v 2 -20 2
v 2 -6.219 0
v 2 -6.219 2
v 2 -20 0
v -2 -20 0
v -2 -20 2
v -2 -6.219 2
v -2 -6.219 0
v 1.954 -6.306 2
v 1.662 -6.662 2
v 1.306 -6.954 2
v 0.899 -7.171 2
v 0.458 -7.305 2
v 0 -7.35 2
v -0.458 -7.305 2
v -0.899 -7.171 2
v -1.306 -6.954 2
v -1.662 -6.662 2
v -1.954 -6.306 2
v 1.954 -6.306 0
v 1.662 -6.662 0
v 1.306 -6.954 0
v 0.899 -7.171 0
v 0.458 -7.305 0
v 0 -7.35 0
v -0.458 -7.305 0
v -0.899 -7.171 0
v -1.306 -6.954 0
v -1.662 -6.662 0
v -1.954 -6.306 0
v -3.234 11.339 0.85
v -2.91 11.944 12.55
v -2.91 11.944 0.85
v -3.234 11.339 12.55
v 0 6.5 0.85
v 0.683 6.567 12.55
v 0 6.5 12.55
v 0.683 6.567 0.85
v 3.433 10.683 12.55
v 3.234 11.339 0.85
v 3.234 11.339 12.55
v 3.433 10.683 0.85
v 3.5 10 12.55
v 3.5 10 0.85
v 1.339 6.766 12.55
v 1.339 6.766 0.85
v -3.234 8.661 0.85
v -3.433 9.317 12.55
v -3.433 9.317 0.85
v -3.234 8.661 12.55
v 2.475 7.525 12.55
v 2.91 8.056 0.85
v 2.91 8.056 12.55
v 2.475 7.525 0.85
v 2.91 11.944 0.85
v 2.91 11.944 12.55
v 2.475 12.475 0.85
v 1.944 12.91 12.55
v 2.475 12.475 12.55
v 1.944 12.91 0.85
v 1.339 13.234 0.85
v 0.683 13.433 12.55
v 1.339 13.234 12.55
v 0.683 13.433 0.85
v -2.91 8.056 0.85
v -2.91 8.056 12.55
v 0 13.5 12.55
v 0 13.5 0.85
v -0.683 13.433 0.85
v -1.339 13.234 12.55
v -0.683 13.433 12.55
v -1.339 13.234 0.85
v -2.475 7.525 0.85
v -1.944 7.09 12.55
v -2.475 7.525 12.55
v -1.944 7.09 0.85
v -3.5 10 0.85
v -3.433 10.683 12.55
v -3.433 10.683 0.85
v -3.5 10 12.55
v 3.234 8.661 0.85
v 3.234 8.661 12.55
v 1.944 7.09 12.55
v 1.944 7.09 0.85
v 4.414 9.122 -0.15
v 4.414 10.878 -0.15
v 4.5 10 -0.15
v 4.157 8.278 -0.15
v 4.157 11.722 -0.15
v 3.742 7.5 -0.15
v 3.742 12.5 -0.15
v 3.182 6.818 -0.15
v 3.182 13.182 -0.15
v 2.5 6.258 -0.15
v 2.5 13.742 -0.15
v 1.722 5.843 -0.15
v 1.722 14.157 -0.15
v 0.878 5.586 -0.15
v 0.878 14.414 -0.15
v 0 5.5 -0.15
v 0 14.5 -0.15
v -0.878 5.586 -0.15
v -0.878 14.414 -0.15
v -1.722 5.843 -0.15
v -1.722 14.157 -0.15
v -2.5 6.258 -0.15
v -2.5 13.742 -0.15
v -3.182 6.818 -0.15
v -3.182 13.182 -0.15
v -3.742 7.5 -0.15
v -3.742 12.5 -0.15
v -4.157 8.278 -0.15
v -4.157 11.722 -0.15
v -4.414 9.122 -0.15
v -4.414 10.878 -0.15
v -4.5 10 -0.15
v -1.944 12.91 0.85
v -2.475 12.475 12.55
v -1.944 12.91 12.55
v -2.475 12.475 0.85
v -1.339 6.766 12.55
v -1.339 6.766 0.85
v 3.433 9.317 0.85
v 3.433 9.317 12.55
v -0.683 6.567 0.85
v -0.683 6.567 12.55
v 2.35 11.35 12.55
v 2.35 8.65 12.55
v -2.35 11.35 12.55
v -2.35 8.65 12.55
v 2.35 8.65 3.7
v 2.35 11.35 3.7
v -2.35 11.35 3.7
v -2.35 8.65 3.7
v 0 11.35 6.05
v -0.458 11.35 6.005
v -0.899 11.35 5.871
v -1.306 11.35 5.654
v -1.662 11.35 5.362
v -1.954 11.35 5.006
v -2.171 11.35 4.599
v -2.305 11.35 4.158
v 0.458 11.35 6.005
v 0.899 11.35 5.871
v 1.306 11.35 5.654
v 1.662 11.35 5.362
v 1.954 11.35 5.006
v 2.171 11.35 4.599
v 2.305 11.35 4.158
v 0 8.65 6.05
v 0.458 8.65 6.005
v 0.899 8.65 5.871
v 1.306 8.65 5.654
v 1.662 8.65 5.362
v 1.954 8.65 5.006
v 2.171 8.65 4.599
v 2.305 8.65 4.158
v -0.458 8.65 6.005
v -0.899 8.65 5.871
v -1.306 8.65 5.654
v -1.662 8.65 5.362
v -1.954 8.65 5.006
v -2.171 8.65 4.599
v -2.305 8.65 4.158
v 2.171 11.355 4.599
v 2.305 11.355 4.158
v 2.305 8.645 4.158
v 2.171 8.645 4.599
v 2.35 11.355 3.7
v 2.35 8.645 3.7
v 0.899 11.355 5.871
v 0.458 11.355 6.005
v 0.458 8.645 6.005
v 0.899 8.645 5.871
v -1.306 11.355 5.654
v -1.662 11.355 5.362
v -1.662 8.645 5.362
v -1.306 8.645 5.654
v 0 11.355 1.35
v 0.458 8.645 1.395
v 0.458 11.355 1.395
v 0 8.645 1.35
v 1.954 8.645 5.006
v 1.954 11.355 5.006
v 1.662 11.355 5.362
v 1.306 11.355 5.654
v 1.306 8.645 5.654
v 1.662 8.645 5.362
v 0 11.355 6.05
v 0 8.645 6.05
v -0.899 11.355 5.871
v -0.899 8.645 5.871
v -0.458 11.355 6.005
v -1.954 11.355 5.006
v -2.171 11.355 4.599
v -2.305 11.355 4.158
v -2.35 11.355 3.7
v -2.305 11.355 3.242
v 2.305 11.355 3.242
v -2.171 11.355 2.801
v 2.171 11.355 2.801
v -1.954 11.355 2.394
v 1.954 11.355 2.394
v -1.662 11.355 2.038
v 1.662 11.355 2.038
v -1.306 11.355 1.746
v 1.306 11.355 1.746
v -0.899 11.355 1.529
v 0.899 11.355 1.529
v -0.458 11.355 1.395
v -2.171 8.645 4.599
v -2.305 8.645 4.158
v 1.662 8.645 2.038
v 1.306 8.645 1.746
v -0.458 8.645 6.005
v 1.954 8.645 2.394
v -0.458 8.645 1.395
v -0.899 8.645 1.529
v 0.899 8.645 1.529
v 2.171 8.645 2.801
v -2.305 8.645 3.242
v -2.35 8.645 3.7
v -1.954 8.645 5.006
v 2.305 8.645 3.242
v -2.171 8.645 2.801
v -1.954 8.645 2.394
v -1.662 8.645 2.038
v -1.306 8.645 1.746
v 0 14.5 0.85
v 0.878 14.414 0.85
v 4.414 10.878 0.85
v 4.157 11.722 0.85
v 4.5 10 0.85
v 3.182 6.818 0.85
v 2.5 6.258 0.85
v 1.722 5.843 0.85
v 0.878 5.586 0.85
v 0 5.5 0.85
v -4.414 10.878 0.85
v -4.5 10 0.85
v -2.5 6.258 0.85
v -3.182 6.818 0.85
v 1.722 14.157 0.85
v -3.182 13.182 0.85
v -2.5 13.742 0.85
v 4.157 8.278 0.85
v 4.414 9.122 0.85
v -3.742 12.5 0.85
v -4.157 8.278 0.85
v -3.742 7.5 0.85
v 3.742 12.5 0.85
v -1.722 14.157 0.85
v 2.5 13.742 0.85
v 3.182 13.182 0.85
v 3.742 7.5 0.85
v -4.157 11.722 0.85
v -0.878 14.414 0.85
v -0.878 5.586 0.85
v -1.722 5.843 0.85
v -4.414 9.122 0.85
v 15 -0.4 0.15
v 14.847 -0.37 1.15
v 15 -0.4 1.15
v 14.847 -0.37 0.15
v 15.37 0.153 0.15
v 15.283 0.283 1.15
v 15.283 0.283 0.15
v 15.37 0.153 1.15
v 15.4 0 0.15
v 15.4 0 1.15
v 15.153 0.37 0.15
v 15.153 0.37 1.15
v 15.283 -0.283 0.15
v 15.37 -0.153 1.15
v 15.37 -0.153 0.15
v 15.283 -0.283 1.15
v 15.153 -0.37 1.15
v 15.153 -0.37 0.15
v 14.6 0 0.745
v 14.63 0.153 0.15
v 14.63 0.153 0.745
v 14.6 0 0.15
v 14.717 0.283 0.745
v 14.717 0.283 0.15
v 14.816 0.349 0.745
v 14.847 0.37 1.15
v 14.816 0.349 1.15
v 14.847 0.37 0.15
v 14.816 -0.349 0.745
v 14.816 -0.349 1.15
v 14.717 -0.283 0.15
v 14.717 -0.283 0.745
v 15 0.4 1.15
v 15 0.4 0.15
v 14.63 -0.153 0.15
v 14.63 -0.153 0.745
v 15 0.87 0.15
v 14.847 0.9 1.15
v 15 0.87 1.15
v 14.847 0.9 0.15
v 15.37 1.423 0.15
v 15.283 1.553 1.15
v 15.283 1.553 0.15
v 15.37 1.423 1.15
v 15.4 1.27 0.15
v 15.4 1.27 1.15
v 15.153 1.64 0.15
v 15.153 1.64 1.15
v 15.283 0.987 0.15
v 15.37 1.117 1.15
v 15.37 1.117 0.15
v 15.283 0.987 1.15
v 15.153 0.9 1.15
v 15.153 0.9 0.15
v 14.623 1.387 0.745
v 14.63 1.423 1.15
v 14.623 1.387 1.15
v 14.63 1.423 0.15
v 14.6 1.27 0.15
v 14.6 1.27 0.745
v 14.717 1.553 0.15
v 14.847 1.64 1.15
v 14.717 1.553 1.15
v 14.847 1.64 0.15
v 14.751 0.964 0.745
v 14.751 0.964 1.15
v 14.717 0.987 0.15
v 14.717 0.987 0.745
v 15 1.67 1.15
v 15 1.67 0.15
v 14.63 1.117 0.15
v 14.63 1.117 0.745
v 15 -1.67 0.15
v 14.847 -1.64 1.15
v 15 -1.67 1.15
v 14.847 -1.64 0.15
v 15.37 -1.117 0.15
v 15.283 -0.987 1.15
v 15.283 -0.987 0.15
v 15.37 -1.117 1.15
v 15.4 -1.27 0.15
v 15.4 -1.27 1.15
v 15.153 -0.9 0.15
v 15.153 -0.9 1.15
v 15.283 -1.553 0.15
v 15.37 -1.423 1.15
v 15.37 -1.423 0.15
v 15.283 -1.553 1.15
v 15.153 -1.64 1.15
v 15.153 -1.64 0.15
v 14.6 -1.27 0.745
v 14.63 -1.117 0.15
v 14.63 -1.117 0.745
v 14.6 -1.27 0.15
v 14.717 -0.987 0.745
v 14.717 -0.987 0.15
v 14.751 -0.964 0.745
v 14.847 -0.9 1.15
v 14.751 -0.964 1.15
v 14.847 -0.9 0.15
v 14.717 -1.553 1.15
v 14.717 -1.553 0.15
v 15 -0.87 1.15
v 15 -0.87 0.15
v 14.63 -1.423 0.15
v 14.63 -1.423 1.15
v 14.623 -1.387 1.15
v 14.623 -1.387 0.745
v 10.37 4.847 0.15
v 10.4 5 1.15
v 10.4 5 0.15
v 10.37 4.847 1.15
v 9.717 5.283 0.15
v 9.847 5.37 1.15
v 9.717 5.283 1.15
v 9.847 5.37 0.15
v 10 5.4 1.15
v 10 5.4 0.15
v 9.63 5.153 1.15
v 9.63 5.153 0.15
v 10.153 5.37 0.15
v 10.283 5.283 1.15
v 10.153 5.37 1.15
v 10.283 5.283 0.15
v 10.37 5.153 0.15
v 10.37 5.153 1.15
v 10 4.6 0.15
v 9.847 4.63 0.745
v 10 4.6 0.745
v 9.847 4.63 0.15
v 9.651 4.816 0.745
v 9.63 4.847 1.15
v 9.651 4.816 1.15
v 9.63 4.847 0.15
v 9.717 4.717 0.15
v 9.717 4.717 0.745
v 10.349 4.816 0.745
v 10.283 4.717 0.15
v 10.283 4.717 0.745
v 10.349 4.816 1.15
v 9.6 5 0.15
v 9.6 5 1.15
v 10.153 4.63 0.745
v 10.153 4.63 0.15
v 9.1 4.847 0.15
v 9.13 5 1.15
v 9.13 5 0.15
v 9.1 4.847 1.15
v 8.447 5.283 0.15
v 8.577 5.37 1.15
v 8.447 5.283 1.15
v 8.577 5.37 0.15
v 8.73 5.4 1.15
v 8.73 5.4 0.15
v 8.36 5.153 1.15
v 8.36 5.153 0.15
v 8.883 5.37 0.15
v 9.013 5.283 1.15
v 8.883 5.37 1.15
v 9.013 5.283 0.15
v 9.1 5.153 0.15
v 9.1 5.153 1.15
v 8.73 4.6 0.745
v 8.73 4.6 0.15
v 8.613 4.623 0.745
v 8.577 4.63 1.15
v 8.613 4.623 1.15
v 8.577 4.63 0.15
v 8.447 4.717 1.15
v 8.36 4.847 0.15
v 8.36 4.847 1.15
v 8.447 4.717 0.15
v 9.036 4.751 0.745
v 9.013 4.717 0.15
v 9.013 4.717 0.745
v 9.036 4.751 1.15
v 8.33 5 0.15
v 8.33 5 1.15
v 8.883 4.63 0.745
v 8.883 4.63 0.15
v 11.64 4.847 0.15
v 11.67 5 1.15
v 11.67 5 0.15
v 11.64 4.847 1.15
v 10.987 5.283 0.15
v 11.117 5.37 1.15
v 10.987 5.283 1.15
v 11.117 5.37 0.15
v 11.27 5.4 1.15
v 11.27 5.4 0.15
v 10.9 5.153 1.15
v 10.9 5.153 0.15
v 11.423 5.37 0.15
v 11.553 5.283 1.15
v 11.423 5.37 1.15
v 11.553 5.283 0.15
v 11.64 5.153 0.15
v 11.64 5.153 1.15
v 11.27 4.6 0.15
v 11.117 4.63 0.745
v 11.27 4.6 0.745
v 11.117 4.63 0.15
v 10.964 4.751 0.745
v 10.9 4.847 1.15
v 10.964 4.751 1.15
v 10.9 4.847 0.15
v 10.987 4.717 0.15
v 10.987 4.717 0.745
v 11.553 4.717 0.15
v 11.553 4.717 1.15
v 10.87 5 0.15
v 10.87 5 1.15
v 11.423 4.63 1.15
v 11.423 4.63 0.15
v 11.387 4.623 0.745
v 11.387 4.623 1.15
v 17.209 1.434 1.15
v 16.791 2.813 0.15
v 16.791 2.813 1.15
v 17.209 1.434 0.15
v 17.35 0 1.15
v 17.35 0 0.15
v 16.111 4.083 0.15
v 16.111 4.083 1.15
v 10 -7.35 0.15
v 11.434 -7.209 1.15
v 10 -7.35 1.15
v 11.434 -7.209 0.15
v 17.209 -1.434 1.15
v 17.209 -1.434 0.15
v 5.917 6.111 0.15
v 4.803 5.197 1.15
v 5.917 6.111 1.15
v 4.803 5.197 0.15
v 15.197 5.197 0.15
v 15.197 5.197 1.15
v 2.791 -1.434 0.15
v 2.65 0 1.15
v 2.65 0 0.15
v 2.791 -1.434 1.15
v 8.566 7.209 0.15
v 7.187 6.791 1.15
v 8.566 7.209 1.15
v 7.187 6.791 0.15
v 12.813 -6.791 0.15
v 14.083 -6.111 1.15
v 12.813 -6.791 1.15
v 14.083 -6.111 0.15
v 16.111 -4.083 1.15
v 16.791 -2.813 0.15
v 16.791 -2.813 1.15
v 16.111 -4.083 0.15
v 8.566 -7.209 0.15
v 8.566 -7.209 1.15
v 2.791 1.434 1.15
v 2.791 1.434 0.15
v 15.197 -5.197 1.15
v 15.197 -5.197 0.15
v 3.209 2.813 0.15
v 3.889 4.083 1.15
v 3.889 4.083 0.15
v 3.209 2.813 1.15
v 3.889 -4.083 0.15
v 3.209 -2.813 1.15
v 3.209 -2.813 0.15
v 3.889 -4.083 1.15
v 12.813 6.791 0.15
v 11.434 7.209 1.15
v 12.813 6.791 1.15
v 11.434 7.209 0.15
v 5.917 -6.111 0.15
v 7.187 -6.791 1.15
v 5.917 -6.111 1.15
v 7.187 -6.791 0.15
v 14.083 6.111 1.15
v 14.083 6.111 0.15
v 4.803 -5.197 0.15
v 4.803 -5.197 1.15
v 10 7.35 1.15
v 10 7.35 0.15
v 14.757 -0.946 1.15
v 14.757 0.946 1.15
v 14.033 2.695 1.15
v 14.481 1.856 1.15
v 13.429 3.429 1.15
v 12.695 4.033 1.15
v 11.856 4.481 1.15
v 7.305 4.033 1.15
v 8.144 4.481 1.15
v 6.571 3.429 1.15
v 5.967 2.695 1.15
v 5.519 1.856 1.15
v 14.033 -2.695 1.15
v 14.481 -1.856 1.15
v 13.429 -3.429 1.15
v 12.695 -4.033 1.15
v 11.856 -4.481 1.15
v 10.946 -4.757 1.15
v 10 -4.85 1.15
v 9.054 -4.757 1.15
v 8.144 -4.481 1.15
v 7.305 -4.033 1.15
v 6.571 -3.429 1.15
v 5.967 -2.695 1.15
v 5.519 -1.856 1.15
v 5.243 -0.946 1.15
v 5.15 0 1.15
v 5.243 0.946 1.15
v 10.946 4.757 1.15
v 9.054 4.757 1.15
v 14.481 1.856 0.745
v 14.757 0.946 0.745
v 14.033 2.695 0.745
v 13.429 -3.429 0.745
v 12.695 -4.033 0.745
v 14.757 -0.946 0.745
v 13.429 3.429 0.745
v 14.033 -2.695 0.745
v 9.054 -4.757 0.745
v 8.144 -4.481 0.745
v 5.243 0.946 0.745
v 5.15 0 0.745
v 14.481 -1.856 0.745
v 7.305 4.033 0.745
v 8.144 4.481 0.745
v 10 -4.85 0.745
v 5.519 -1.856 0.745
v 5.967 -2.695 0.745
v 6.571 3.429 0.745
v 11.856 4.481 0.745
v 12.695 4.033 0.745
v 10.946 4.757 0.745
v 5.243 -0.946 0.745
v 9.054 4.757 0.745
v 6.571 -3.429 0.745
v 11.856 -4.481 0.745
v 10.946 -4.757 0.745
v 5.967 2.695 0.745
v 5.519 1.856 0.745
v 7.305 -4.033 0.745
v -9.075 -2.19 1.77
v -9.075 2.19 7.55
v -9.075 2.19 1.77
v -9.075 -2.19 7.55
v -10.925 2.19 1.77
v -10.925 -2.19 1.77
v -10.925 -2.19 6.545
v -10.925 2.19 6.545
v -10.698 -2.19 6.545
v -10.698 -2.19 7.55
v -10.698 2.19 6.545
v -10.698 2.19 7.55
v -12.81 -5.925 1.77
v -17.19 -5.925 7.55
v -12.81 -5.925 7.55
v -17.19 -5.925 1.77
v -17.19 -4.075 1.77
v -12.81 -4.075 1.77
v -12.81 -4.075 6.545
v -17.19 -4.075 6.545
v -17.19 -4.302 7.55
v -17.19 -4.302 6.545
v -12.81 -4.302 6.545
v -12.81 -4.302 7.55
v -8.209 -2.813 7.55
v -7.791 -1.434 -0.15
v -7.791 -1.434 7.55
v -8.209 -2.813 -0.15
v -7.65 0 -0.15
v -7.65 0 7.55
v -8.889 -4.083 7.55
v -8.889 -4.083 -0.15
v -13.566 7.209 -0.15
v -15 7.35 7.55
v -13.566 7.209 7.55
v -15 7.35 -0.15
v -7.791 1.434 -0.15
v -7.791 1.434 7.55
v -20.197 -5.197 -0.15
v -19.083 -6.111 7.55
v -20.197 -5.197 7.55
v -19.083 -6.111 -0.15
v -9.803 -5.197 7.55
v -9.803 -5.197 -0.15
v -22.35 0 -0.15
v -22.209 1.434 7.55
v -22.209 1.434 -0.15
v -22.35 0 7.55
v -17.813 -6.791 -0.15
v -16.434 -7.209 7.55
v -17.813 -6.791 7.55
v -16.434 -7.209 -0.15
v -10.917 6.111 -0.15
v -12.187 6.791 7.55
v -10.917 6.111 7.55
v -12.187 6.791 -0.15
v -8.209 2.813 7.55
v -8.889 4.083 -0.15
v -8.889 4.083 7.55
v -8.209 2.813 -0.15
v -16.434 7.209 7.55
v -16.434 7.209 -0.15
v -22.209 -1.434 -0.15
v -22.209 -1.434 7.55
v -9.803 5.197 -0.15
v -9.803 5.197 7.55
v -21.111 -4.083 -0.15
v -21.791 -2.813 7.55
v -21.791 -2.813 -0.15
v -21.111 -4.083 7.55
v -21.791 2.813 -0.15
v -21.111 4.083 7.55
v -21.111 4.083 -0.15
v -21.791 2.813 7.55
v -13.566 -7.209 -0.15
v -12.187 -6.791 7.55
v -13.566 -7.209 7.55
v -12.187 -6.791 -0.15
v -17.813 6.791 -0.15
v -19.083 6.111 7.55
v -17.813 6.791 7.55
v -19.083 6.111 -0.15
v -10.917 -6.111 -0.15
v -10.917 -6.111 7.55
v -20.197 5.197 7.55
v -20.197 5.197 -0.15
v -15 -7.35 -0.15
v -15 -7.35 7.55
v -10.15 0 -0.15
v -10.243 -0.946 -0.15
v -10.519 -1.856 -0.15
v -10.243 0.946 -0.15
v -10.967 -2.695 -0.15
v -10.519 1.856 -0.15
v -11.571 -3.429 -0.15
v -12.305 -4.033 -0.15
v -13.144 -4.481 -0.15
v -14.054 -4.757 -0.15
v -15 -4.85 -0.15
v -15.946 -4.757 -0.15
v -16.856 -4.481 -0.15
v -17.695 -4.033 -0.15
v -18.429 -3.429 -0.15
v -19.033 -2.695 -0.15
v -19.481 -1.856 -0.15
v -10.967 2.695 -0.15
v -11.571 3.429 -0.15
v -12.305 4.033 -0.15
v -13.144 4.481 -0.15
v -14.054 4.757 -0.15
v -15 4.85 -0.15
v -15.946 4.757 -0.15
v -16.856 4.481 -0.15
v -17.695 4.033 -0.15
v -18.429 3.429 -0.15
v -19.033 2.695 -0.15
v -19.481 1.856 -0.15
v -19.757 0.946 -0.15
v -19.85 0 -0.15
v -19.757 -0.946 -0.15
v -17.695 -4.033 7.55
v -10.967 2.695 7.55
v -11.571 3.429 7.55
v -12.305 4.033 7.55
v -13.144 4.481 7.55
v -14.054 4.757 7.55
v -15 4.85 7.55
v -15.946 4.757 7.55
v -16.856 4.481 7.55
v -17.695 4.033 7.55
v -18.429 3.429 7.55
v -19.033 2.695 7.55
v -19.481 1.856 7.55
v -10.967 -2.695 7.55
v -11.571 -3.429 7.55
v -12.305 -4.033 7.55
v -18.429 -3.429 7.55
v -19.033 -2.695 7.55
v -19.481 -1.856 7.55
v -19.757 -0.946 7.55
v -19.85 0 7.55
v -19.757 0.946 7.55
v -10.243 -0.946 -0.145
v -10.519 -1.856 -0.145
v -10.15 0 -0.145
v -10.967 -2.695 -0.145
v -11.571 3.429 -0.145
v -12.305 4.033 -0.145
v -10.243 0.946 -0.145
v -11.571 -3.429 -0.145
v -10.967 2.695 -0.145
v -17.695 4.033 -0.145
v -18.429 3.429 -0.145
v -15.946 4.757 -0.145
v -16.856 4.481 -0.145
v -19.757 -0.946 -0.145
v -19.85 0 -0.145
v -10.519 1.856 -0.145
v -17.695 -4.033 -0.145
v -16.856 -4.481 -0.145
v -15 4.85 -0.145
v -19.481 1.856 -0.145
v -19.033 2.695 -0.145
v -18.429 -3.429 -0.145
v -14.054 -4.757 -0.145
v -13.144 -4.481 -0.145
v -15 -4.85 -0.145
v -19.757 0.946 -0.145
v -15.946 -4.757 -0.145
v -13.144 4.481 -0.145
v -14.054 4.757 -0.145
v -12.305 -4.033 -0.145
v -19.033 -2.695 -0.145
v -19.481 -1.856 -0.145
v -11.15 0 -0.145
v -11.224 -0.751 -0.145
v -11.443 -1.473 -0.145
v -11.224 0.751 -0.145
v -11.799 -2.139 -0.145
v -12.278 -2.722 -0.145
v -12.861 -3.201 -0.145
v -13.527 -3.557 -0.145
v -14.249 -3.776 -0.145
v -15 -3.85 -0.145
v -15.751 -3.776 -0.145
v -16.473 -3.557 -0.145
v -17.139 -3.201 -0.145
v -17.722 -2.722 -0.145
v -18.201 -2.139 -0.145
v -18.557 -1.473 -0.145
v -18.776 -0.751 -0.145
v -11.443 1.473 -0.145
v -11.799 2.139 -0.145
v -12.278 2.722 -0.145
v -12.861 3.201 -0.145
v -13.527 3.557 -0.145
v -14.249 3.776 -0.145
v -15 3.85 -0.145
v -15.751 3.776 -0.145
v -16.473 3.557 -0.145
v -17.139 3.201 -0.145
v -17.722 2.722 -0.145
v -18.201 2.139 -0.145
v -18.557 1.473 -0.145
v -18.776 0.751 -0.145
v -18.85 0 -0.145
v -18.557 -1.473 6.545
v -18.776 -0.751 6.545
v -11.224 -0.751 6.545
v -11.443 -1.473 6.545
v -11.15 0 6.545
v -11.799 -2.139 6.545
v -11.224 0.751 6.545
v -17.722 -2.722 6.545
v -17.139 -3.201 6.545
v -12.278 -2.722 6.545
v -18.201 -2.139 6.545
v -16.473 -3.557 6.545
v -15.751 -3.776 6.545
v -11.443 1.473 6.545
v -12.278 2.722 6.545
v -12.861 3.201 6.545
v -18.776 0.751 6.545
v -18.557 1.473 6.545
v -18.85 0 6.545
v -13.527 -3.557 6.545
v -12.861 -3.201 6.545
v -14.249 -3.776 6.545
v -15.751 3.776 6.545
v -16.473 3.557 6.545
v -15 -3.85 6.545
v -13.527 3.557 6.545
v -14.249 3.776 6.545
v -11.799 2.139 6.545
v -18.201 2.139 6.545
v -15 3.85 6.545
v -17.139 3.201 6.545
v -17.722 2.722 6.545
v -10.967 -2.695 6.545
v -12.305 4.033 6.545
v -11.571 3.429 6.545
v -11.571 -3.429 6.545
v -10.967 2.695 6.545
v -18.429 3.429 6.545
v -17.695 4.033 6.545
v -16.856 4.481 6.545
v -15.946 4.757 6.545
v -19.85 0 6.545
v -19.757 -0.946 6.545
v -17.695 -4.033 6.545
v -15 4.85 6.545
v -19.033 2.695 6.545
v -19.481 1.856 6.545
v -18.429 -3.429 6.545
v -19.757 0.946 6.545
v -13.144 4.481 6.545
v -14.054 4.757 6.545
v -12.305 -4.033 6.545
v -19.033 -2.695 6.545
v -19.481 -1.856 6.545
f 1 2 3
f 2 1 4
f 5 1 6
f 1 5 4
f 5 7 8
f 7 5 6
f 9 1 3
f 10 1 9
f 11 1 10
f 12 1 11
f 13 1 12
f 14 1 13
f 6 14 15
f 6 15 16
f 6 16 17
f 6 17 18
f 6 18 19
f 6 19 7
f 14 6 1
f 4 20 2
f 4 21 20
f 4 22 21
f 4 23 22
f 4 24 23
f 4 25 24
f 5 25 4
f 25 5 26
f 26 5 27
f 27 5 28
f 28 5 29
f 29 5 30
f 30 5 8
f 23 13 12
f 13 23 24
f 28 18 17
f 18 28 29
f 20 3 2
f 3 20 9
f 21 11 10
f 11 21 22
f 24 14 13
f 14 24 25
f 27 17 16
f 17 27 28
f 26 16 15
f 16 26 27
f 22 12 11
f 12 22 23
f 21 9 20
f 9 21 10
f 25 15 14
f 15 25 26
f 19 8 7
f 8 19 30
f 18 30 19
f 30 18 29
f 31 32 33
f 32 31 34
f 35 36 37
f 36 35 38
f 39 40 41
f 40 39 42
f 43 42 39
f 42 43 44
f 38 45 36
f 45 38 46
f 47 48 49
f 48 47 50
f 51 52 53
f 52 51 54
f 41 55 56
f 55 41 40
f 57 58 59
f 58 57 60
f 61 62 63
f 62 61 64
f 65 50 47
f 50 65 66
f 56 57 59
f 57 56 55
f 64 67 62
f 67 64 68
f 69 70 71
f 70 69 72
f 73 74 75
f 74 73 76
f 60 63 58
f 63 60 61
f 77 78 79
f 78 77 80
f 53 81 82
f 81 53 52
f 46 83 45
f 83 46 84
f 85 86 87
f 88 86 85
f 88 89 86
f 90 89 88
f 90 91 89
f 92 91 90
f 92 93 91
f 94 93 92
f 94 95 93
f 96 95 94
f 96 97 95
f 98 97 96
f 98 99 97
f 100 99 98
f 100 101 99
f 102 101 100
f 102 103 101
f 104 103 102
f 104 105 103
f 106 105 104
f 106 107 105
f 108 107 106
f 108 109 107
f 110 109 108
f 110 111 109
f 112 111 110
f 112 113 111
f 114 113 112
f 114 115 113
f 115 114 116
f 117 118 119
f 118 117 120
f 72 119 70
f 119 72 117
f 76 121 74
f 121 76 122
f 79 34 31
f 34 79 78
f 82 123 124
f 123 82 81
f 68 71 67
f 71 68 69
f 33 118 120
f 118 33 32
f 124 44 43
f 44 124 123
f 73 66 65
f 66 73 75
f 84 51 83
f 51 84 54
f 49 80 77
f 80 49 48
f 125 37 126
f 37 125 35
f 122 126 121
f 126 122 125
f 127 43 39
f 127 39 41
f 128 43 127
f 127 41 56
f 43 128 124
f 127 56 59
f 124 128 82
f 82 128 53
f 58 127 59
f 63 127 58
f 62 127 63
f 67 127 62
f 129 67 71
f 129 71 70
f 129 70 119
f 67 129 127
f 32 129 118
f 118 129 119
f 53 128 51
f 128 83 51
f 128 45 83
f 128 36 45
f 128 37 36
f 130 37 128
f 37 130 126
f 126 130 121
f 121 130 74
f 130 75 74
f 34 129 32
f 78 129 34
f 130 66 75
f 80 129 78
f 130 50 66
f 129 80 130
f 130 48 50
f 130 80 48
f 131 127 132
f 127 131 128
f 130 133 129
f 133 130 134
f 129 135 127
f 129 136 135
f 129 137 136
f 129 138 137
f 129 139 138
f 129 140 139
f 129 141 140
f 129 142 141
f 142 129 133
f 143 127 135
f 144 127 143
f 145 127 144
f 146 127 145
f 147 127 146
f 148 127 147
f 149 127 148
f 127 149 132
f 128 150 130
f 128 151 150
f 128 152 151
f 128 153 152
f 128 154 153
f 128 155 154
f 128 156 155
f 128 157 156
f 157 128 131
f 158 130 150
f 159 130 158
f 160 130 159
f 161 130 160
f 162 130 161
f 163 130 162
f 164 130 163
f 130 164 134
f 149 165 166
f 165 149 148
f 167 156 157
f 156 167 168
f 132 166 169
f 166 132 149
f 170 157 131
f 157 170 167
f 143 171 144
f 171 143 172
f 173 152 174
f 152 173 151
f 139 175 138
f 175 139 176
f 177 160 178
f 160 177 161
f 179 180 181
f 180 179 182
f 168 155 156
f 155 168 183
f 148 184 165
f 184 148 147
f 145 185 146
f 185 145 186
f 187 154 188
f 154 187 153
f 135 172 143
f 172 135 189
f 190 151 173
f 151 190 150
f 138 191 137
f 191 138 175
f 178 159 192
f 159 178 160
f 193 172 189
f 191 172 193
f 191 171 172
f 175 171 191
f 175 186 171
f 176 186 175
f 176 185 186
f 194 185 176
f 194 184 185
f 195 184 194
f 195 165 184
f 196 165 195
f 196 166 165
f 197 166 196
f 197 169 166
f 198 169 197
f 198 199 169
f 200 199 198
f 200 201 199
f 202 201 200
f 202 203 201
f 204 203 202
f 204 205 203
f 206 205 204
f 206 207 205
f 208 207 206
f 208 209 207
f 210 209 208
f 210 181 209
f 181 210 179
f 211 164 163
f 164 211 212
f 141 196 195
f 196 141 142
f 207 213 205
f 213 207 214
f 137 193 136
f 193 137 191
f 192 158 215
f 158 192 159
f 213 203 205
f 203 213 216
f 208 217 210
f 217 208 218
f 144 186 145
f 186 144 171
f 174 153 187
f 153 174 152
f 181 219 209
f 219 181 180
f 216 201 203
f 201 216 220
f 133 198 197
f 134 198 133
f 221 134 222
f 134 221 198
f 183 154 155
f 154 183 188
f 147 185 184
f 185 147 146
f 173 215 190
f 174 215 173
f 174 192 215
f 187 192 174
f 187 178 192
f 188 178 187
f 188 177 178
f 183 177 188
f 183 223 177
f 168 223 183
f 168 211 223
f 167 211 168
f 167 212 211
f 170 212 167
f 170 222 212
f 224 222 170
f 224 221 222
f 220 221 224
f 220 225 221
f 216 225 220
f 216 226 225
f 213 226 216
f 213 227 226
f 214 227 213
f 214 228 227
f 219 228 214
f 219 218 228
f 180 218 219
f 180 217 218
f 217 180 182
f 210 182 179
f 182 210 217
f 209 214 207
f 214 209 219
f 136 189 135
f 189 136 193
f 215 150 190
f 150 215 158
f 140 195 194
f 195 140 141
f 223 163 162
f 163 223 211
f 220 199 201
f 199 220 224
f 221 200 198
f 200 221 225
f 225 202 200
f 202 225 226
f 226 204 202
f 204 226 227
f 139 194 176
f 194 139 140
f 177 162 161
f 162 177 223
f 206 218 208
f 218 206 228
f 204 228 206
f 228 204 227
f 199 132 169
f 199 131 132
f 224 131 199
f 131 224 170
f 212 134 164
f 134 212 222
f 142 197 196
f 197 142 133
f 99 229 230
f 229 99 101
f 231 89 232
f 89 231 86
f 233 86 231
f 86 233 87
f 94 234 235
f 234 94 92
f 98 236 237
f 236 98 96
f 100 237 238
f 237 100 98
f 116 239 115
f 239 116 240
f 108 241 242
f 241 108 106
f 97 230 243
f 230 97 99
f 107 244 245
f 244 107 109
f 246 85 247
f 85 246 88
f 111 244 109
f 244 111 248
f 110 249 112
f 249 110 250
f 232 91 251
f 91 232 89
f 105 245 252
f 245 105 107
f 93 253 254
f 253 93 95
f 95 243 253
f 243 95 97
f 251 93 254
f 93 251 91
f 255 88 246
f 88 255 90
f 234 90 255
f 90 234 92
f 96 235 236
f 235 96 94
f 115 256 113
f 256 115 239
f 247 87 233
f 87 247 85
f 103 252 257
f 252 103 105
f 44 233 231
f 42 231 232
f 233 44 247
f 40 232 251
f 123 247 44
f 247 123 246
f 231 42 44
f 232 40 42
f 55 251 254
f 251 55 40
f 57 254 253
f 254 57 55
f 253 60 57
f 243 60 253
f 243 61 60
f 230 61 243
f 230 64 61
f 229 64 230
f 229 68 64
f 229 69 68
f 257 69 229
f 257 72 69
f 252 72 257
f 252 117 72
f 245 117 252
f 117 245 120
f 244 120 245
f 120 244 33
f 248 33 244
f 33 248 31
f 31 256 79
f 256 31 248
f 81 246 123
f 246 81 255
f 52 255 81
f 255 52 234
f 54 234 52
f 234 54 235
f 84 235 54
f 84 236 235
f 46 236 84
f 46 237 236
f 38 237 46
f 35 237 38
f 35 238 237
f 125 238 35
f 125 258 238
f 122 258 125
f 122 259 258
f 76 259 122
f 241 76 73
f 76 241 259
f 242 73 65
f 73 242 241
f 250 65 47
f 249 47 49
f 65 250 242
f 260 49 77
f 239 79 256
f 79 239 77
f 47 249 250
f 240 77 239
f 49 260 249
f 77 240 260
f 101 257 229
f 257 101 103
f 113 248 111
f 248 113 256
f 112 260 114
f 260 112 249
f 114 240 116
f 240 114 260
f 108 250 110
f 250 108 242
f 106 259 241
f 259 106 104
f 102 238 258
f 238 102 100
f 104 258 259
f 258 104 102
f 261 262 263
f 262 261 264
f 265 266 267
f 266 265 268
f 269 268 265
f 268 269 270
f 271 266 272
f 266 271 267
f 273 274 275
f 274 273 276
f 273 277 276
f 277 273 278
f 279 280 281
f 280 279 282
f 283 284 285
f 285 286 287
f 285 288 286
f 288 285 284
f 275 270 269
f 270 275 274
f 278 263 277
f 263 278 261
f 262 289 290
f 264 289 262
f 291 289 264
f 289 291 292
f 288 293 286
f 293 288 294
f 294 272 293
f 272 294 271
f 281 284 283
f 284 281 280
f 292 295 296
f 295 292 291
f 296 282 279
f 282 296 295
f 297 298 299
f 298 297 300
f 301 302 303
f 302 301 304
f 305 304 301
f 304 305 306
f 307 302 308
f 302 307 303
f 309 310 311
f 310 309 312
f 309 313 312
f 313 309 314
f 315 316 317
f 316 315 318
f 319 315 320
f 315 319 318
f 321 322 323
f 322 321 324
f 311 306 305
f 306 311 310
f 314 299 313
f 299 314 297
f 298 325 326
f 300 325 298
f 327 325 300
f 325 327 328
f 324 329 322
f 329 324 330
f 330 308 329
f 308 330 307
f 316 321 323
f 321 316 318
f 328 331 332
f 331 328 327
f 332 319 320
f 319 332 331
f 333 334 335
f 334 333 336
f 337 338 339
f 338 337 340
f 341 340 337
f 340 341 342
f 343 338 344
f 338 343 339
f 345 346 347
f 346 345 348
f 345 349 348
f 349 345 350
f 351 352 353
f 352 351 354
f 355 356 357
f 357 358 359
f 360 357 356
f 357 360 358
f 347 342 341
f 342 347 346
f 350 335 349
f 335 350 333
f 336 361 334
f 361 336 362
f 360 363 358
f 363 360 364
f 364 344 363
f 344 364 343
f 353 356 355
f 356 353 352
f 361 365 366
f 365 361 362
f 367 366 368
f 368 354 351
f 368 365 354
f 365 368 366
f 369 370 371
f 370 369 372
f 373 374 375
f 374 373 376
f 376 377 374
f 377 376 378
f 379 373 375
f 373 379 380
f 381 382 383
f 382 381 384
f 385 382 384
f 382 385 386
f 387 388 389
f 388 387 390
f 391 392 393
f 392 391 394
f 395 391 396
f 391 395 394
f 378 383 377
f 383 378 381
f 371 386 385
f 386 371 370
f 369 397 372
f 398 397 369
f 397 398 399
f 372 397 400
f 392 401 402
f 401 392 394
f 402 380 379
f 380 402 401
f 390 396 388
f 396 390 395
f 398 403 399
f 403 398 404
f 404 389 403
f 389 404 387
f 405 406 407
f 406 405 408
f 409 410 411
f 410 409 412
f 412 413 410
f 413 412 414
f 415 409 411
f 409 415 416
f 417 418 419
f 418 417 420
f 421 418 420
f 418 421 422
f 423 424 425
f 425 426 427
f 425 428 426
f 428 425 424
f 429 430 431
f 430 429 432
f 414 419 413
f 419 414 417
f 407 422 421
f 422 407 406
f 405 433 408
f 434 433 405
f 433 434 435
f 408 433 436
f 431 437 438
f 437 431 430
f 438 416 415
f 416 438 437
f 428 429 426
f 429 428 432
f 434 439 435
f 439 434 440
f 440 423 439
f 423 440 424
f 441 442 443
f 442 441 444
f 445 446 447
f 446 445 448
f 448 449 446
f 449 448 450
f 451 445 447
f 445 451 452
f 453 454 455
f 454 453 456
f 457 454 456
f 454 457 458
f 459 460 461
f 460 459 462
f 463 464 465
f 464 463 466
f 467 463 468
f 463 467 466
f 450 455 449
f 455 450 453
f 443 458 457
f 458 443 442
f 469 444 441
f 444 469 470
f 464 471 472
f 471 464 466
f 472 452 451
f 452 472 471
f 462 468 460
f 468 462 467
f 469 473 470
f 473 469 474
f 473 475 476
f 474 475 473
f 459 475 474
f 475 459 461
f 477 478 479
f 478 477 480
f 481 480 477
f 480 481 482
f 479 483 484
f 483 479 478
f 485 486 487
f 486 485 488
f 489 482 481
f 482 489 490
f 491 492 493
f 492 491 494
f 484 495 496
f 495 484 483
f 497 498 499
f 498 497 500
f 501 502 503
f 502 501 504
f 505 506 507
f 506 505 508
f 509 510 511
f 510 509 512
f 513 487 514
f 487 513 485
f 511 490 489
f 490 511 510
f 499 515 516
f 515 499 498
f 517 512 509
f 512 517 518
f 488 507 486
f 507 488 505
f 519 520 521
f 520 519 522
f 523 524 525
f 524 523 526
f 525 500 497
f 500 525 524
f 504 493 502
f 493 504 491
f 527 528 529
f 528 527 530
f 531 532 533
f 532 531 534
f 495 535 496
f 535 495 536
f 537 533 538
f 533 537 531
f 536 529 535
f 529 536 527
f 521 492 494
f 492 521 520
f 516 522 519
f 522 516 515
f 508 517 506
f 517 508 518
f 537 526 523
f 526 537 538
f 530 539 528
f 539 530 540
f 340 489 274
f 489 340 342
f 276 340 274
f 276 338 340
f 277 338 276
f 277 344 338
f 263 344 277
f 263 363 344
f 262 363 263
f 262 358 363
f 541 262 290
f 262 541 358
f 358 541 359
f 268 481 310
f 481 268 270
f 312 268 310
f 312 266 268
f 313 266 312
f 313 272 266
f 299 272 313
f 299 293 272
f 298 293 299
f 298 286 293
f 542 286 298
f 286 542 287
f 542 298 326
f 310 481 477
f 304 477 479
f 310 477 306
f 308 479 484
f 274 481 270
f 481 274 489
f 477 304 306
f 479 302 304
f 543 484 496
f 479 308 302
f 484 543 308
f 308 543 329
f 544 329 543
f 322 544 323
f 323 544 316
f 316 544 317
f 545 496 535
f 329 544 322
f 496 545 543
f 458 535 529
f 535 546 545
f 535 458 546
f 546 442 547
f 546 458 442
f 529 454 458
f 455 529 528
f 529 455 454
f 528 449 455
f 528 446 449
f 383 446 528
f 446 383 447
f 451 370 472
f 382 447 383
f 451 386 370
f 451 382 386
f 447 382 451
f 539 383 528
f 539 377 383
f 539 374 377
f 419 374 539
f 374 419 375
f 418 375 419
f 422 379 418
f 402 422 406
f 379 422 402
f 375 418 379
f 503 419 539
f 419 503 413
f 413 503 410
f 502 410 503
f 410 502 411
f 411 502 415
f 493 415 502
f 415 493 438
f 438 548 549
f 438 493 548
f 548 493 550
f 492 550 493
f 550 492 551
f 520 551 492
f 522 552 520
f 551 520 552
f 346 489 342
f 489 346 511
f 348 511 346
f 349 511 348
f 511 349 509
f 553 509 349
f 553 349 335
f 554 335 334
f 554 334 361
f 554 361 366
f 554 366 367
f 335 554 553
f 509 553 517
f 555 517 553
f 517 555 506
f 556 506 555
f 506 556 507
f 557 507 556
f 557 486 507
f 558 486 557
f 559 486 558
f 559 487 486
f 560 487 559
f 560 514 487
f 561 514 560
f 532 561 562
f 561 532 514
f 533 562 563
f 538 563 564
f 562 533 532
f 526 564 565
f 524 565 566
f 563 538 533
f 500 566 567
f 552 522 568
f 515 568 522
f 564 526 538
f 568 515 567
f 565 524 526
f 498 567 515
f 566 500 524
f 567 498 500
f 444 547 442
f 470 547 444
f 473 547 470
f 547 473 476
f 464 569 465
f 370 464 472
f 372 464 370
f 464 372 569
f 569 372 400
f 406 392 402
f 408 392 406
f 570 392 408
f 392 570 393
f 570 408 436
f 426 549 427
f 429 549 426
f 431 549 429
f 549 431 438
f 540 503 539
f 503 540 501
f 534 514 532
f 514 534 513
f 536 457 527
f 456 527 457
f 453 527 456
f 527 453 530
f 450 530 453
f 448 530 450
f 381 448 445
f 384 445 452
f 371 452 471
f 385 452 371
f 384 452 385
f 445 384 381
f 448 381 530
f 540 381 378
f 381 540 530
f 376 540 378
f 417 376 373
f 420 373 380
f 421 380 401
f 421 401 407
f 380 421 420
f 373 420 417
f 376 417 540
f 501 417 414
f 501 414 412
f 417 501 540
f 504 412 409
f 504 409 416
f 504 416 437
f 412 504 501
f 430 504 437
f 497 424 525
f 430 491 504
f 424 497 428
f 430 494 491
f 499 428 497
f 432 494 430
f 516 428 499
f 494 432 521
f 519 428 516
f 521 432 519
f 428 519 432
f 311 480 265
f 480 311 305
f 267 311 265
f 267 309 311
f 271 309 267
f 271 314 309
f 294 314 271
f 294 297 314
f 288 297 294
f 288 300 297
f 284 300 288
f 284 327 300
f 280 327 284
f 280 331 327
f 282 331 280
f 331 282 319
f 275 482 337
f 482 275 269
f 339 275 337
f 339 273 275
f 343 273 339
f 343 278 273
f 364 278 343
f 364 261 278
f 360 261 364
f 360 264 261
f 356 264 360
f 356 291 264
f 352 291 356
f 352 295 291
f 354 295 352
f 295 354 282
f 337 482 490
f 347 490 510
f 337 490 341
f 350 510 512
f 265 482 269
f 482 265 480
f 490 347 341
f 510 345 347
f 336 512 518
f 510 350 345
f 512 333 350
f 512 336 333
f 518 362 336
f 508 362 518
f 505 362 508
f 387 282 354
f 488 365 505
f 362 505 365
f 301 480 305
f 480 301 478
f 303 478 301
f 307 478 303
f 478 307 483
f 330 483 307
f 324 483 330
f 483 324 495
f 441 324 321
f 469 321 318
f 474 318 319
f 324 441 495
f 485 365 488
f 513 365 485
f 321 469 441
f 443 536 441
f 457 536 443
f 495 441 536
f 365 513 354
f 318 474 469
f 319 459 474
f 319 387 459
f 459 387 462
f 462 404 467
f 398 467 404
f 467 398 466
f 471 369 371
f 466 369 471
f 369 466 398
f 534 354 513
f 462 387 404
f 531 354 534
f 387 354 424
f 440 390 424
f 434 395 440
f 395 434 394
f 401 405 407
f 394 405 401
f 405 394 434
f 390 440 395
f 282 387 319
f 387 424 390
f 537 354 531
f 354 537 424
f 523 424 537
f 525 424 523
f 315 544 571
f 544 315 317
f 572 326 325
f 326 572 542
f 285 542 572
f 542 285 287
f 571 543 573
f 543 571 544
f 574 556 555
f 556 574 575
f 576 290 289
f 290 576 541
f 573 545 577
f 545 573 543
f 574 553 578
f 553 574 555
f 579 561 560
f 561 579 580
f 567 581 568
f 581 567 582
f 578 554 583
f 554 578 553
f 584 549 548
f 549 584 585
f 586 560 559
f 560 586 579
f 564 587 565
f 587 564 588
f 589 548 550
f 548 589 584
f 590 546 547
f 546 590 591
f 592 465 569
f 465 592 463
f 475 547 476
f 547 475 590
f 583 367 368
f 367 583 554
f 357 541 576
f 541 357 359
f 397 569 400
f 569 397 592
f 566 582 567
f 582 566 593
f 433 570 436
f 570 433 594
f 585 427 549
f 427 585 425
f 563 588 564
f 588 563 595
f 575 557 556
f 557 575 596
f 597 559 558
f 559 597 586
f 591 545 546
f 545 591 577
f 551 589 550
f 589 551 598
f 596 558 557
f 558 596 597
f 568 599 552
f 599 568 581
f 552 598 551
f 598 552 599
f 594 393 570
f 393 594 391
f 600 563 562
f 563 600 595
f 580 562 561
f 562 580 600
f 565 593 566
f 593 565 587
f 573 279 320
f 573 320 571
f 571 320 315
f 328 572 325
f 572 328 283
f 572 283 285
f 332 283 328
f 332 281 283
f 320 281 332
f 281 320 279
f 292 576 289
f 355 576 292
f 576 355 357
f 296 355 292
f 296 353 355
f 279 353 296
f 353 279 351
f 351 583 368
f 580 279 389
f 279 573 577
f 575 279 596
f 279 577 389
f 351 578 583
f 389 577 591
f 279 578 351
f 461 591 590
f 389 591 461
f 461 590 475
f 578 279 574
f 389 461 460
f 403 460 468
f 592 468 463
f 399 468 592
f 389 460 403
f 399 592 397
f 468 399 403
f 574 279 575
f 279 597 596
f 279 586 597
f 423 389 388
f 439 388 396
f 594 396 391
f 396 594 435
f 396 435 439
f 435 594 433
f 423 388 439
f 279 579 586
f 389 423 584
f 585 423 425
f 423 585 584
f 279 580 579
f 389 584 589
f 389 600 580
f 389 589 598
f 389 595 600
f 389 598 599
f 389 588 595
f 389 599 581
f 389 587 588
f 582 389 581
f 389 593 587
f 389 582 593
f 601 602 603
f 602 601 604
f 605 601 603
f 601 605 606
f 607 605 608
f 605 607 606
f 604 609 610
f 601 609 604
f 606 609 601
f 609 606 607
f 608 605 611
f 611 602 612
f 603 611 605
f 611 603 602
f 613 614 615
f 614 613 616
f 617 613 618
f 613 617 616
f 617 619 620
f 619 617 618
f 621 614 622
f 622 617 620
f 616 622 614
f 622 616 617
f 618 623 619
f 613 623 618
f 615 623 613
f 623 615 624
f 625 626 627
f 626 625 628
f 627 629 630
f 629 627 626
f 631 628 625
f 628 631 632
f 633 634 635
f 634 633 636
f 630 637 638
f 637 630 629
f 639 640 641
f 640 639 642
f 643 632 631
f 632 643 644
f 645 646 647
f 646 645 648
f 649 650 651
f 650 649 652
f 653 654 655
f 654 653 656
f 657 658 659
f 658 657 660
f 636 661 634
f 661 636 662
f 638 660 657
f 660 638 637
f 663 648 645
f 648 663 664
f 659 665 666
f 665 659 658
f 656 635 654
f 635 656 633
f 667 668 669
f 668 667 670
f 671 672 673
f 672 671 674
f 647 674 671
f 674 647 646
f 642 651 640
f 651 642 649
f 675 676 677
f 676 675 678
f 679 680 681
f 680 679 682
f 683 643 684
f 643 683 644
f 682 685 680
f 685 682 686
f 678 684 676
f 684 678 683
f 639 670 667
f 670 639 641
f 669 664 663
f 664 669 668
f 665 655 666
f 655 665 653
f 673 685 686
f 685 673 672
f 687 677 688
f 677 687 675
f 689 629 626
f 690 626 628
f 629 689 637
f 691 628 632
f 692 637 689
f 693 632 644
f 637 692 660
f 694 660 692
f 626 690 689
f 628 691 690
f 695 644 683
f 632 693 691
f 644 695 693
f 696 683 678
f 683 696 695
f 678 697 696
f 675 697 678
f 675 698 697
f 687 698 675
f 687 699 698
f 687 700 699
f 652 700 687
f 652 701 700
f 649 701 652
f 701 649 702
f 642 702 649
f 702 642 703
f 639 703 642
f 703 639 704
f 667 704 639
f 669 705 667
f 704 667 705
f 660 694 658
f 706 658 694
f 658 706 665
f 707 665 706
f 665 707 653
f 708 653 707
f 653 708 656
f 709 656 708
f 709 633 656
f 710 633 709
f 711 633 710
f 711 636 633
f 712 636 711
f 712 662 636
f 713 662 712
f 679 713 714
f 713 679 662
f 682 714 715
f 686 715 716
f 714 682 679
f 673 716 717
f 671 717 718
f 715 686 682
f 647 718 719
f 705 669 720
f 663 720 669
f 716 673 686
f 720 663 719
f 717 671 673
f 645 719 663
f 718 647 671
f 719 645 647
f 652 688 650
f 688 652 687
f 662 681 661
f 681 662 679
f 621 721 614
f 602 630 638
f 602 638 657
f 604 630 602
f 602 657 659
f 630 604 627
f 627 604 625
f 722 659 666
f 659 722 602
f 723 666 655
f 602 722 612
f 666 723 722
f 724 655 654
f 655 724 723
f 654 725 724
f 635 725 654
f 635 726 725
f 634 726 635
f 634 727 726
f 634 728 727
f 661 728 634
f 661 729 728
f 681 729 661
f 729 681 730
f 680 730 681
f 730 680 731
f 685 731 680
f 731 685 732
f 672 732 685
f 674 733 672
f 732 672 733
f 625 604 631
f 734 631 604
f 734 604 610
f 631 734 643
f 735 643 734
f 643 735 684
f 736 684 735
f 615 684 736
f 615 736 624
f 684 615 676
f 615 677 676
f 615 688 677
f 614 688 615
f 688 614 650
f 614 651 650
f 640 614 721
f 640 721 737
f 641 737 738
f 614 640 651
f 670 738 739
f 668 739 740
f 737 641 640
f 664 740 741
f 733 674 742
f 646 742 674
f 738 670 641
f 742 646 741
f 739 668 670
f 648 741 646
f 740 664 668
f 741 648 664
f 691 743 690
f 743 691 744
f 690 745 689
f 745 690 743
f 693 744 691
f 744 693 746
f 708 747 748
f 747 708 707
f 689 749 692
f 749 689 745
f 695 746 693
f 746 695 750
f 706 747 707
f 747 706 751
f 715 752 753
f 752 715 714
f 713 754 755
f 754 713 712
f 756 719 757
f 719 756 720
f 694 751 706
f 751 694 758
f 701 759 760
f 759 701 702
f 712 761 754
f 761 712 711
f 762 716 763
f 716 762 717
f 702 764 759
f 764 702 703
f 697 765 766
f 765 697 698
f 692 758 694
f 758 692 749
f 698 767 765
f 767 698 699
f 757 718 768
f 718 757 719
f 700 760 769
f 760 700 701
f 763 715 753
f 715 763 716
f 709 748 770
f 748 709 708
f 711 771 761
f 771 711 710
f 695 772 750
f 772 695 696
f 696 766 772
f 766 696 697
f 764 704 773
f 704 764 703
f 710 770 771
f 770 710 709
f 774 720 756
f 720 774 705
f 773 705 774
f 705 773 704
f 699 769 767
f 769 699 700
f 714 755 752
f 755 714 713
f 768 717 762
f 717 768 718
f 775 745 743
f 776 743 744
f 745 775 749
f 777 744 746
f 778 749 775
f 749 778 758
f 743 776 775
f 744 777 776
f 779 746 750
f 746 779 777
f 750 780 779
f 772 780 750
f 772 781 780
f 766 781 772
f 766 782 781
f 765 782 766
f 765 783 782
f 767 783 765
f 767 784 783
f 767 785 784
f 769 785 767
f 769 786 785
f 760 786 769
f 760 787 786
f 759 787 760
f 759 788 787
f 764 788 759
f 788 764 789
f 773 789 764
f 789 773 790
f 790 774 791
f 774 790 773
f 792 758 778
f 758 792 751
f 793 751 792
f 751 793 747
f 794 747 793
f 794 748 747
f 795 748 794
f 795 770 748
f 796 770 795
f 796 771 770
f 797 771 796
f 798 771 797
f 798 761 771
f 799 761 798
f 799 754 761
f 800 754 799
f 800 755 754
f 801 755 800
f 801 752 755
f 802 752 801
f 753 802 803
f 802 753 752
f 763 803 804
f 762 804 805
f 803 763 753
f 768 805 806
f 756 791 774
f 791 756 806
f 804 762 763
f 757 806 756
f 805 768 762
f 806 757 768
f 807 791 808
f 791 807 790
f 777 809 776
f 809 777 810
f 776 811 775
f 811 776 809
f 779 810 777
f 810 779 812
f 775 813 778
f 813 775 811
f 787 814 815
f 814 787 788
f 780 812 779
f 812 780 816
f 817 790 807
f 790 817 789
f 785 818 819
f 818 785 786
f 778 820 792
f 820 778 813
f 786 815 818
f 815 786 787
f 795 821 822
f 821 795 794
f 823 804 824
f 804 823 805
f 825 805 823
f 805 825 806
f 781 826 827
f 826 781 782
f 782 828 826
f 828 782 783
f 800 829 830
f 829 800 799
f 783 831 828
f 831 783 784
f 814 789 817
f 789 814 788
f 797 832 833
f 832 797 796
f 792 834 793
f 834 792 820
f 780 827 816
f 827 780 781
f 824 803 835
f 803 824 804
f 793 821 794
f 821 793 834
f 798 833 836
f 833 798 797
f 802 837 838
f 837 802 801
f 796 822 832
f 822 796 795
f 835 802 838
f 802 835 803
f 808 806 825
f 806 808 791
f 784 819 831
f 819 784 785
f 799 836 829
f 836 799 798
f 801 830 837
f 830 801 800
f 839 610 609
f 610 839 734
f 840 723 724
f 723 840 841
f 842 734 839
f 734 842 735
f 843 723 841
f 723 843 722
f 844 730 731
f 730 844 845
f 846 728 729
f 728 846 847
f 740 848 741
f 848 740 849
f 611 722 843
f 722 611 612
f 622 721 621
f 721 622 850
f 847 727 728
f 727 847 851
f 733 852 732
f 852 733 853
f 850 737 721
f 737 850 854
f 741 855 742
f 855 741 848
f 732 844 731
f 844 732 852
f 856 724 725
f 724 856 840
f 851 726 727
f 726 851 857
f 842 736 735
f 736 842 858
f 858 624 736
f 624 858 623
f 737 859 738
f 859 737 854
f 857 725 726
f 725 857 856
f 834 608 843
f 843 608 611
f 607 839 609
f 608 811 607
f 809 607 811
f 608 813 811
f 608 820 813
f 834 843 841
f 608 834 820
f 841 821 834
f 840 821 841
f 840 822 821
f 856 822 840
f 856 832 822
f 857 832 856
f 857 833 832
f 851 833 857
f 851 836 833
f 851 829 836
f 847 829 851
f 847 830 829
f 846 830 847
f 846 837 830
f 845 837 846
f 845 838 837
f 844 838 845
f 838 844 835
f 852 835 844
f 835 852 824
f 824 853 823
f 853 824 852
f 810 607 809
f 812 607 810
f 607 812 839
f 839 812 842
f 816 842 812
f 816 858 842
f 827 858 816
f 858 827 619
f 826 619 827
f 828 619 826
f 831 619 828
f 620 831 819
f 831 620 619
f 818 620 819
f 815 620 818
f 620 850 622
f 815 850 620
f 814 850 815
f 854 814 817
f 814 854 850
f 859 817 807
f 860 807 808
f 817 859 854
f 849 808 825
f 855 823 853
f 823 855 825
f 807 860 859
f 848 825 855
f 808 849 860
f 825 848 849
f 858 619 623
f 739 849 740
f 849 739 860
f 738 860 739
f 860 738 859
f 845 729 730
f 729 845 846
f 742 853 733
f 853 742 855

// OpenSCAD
mgh=2;
mgd=4;
delta=0.7;
hndl=15;

module handle(differ=false) {
   if (differ)
        difference() {
            translate([0,0,hndl/2])
                cube([mgd, mgh, hndl], center=true);
            rotate([90,0,0])
                cylinder(d=mgd+delta, h=mgh+0.01, center=true, $fn=32);
        }
    else
        union() {
            translate([0,0,hndl/2])
                cube([mgd+delta, mgh+delta, hndl], center=true);
            rotate([90,0,0])
                cylinder(d=mgd+delta, h=mgh+delta+0.01, center=true, $fn=32);
        };
    
}

module rotor() {
    difference() {
        union() {
            cylinder(d=mgd+3, h=mgd+delta+3, center=true, $fn=32);
            translate([0,0,(mgd+delta+3+5)/2])
                cylinder(d=mgd+3, h=5, center=true, $fn=32);
        }
        handle();
    }
    translate([0,0,-(mgd+delta+3-1)/2])
        cylinder(d=mgd+5, h=1, center=true, $fn=32);
}

module top() {
    difference() {
        translate([0,0,(mgd+delta+3+1)/2])
            cylinder(d=mgd+5, h=1, center=true, $fn=32);
        handle();
    }

}

module stator() {
    difference() {
        translate([0,0,0])
            cylinder(d=mgd+delta+10, h=mgd+delta+3, center=true, $fn=32);
        translate([0,0,(mgd+delta+3+1)/2])
            cylinder(d=mgd+delta+5, h=1+0.01, center=true, $fn=32);
        cylinder(d=mgd+delta+3, h=mgd+delta+3+0.01, center=true, $fn=32);
        translate([0,0,-(mgd+delta+3-1)/2])
            cylinder(d=mgd+delta+5, h=1+0.01, center=true, $fn=32);
        translate([5,0,0]) {
            cube([1.55+delta-0.4, 4.08+delta-0.4, 3.16+delta], center=true);
            translate([0,0,-2.5])
                cube([1.55+delta-0.4, 4.08+delta-0.4, 5], center=true);
        }
        rotate([0,0,90])
        translate([5,0,0]) {
            cube([1.55+delta-0.4, 4.08+delta-0.4, 3.16+delta], center=true);
            translate([0,0,-2.5])
                cube([1.55+delta-0.4, 4.08+delta-0.4, 5], center=true);
        }

    }

}

module bottom() {
    difference() {
        translate([0,0,(mgd+delta+3+1)/2])
            cylinder(d=mgd+delta+10, h=1, center=true, $fn=32);

        translate([0,0,(mgd+delta+3+1+0.6)/2])
            cylinder(d=mgd+delta+5, h=0.4+0.01, center=true, $fn=32);

        translate([5,0,0]) {
            translate([0,0,0])
                cylinder(d=0.8, h=10, center=true, $fn=16);
            translate([0,1.27,0])
                cylinder(d=0.8, h=10, center=true, $fn=16);
            translate([0,-1.27,0])
                cylinder(d=0.8, h=10, center=true, $fn=16);
        }

        rotate([0,0,90])
        translate([5,0,0]) {
            translate([0,0,0])
                cylinder(d=0.8, h=10, center=true, $fn=16);
            translate([0,1.27,0])
                cylinder(d=0.8, h=10, center=true, $fn=16);
            translate([0,-1.27,0])
                cylinder(d=0.8, h=10, center=true, $fn=16);
        }

    }

}


translate([0,-5,1])
rotate([90,0,0])
handle(true);

translate([0,10,3.7])
rotor();

//translate([0,0,-3.7])
//top();

translate([10,0,-3.7])
bottom();

translate([-15,0,3.7])
rotate([180,0,0])
stator();
